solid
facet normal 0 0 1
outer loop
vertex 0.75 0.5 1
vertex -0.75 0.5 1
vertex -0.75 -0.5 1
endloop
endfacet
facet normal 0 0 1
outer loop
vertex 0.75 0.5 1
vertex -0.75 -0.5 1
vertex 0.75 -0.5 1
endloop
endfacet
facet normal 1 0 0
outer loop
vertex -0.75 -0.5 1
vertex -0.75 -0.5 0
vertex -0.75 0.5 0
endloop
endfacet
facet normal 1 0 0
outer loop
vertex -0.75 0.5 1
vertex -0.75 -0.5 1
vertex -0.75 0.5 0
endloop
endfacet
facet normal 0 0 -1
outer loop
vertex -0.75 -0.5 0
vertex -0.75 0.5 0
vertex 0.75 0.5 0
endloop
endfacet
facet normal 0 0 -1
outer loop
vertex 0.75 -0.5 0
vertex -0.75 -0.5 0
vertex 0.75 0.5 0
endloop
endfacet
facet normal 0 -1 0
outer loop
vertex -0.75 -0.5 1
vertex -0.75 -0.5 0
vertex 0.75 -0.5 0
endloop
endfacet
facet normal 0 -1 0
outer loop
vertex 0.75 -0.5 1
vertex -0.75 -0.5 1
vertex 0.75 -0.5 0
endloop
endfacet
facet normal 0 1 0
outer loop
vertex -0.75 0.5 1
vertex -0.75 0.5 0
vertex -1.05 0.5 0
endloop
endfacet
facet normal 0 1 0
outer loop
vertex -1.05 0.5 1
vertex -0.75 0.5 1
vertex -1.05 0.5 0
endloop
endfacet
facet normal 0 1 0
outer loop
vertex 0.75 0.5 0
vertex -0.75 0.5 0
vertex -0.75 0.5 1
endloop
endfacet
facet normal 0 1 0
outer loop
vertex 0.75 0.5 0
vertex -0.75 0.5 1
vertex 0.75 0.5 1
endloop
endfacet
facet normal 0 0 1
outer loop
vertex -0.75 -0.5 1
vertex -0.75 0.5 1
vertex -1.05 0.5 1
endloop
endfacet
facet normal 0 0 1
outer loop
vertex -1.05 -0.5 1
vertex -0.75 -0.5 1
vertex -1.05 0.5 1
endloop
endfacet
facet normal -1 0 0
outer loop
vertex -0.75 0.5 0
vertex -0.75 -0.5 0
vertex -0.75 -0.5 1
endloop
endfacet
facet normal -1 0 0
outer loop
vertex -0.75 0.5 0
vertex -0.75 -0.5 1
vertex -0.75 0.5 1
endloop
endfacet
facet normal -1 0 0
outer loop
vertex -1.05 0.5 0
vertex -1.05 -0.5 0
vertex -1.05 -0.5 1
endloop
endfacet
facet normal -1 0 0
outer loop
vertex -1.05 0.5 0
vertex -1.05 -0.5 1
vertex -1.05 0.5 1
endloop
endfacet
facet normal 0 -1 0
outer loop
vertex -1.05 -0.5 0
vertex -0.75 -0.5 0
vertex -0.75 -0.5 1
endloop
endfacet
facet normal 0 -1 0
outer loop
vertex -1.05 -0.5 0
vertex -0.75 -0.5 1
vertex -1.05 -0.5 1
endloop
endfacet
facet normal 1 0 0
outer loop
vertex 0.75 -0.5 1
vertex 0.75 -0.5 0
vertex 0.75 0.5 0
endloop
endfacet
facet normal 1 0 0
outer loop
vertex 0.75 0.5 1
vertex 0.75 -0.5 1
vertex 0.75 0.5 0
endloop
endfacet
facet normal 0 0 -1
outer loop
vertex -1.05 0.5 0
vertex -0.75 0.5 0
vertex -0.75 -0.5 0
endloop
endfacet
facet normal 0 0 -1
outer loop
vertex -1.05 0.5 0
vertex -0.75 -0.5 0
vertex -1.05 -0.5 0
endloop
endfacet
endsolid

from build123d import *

# Parameters (mm, degrees)
SKETCH_W     = 1.5
SKETCH_H     = 1
PAD_DEPTH    = 1
SKETCH001_W  = 0.3
SKETCH001_H  = 1
PAD001_DEPTH = 1


with BuildPart() as body:
    # Sketch → Pad (new body)
    with BuildSketch(Plane.XY):
        Rectangle(SKETCH_W, SKETCH_H)
    extrude(amount=PAD_DEPTH)


with BuildPart() as body001:
    # Sketch001 → Pad001 (new body)
    with BuildSketch(Plane.XY):
        with Locations((0.9, 0)):
            Rectangle(SKETCH001_W, SKETCH001_H)
    extrude(amount=PAD001_DEPTH)


with BuildPart() as part_mirroring:
    # Part__Mirroring: instance of Body001
    add(body001.part.mirror(Plane(origin=(0, 0, 0), x_dir=(0, -1, 0), z_dir=(1, 0, 0))))


solid = Compound([body.part, part_mirroring.part])
